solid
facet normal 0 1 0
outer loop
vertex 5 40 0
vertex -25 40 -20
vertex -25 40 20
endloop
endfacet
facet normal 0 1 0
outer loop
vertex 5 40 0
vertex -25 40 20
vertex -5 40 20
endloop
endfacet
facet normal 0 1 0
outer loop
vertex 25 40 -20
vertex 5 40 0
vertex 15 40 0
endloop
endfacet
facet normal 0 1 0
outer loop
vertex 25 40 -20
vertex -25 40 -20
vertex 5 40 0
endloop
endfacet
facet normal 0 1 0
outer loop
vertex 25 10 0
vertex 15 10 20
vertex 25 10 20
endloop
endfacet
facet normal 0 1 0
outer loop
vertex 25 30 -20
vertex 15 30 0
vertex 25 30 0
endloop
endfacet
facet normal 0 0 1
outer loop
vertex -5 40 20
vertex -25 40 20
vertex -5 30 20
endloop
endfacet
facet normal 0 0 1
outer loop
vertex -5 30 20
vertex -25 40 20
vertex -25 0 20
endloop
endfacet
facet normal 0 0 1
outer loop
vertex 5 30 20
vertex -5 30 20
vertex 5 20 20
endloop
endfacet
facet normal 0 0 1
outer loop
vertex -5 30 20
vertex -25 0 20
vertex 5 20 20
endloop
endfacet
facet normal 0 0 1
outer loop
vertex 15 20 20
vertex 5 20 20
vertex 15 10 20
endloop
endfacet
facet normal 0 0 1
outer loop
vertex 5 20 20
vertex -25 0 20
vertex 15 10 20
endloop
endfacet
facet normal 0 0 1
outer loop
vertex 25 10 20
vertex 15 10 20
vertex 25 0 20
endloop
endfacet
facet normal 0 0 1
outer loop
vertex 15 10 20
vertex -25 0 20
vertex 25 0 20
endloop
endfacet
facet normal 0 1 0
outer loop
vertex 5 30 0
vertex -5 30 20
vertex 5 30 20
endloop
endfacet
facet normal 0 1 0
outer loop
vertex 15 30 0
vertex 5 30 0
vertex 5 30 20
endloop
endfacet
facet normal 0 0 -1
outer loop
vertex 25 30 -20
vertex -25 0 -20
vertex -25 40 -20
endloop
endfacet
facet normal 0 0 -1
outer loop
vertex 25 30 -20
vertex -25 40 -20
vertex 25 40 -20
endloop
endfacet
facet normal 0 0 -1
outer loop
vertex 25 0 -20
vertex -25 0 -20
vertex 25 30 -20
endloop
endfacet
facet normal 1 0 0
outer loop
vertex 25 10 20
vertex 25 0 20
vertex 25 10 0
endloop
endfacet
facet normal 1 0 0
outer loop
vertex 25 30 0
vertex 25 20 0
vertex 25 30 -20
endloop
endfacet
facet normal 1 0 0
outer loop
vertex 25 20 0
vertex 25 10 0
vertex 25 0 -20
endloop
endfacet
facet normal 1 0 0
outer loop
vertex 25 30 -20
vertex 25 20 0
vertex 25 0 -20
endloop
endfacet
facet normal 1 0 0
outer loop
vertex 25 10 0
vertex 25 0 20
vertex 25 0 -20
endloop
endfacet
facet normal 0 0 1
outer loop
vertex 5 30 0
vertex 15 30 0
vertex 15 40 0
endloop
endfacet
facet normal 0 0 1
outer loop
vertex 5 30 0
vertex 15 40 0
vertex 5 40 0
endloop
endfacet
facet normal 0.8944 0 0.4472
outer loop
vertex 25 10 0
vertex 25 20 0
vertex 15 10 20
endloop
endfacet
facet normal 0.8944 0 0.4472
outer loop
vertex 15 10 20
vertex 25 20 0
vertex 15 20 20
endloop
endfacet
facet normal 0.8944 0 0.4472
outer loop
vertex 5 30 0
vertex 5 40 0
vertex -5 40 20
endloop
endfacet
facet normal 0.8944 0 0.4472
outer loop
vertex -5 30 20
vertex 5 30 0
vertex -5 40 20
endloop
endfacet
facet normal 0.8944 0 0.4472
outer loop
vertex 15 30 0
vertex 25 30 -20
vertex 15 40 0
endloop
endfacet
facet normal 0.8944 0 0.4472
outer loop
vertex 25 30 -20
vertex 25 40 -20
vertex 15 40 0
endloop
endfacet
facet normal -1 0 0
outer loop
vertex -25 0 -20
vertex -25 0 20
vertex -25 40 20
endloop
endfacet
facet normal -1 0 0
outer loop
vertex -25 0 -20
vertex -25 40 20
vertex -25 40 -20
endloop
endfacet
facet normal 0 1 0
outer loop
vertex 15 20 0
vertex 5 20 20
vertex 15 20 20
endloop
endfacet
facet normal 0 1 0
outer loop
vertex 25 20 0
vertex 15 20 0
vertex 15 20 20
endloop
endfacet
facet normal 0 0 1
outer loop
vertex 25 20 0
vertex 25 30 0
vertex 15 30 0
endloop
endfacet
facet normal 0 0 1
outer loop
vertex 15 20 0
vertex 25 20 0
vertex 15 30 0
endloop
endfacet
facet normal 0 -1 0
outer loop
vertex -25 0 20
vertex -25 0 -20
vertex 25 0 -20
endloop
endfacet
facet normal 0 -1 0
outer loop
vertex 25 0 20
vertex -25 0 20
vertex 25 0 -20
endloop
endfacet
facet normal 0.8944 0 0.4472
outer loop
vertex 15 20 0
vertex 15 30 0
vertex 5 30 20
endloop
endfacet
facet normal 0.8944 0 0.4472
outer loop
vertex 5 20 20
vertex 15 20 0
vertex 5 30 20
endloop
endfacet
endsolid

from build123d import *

# Parameters (mm, degrees)
SKETCH_1_W               = 50
SKETCH_1_H               = 40
EXTRUDE_1_DEPTH          = 40
CUT_EXTRUDE_1_DEPTH      = 30
CUT_EXTRUDE_2_DEPTH      = 20
CUT_EXTRUDE_3_DEPTH      = 10
CUT_EXTRUDE_4_DEPTH      = 1
CUT_EXTRUDE_4_DEPTH_BACK = 10


with BuildPart() as part:
    # 草圖1 → 填料-伸長1 (new body)
    with BuildSketch(Plane(origin=(0, 0, 0), x_dir=(1, 0, 0), z_dir=(0, 1, 0))):
        Rectangle(SKETCH_1_W, SKETCH_1_H)
    extrude(amount=EXTRUDE_1_DEPTH)

    # 草圖2 → 除料-伸長1 (cut)
    with BuildSketch(Plane(origin=(0, 40, 0), x_dir=(1, 0, 0), z_dir=(0, 1, 0))):
        Polygon((25, 0), (15, -20), (25, -20), align=None)
    extrude(amount=-CUT_EXTRUDE_1_DEPTH, mode=Mode.SUBTRACT)

    # 草圖3 → 除料-伸長2 (cut)
    with BuildSketch(Plane(origin=(0, 40, 0), x_dir=(1, 0, 0), z_dir=(0, 1, 0))):
        Polygon((25, 0), (15, 0), (5, -20), (15, -20), align=None)
    extrude(amount=-CUT_EXTRUDE_2_DEPTH, mode=Mode.SUBTRACT)

    # 草圖3<3> → 除料-伸長3 (cut)
    with BuildSketch(Plane(origin=(0, 40, 0), x_dir=(1, 0, 0), z_dir=(0, 1, 0))):
        Polygon((25, 0), (25, 20), (15, 0), align=None)
    extrude(amount=-CUT_EXTRUDE_3_DEPTH, mode=Mode.SUBTRACT)

    # 草圖4 → 除料-伸長4 (cut, two sides)
    with BuildSketch(Plane(origin=(0, 40, 0), x_dir=(1, 0, 0), z_dir=(0, 1, 0))) as cut_extrude_4_sk:
        Polygon((125, 0), (15, 0), (5, 0), (-5, -20), (5, -20), (115, -20), (311.77398202, -118.38699101), (321.77398202, -98.38699101), align=None)
    extrude(amount=CUT_EXTRUDE_4_DEPTH, mode=Mode.SUBTRACT)
    extrude(cut_extrude_4_sk.sketch, amount=-CUT_EXTRUDE_4_DEPTH_BACK, mode=Mode.SUBTRACT)


solid = part.part
